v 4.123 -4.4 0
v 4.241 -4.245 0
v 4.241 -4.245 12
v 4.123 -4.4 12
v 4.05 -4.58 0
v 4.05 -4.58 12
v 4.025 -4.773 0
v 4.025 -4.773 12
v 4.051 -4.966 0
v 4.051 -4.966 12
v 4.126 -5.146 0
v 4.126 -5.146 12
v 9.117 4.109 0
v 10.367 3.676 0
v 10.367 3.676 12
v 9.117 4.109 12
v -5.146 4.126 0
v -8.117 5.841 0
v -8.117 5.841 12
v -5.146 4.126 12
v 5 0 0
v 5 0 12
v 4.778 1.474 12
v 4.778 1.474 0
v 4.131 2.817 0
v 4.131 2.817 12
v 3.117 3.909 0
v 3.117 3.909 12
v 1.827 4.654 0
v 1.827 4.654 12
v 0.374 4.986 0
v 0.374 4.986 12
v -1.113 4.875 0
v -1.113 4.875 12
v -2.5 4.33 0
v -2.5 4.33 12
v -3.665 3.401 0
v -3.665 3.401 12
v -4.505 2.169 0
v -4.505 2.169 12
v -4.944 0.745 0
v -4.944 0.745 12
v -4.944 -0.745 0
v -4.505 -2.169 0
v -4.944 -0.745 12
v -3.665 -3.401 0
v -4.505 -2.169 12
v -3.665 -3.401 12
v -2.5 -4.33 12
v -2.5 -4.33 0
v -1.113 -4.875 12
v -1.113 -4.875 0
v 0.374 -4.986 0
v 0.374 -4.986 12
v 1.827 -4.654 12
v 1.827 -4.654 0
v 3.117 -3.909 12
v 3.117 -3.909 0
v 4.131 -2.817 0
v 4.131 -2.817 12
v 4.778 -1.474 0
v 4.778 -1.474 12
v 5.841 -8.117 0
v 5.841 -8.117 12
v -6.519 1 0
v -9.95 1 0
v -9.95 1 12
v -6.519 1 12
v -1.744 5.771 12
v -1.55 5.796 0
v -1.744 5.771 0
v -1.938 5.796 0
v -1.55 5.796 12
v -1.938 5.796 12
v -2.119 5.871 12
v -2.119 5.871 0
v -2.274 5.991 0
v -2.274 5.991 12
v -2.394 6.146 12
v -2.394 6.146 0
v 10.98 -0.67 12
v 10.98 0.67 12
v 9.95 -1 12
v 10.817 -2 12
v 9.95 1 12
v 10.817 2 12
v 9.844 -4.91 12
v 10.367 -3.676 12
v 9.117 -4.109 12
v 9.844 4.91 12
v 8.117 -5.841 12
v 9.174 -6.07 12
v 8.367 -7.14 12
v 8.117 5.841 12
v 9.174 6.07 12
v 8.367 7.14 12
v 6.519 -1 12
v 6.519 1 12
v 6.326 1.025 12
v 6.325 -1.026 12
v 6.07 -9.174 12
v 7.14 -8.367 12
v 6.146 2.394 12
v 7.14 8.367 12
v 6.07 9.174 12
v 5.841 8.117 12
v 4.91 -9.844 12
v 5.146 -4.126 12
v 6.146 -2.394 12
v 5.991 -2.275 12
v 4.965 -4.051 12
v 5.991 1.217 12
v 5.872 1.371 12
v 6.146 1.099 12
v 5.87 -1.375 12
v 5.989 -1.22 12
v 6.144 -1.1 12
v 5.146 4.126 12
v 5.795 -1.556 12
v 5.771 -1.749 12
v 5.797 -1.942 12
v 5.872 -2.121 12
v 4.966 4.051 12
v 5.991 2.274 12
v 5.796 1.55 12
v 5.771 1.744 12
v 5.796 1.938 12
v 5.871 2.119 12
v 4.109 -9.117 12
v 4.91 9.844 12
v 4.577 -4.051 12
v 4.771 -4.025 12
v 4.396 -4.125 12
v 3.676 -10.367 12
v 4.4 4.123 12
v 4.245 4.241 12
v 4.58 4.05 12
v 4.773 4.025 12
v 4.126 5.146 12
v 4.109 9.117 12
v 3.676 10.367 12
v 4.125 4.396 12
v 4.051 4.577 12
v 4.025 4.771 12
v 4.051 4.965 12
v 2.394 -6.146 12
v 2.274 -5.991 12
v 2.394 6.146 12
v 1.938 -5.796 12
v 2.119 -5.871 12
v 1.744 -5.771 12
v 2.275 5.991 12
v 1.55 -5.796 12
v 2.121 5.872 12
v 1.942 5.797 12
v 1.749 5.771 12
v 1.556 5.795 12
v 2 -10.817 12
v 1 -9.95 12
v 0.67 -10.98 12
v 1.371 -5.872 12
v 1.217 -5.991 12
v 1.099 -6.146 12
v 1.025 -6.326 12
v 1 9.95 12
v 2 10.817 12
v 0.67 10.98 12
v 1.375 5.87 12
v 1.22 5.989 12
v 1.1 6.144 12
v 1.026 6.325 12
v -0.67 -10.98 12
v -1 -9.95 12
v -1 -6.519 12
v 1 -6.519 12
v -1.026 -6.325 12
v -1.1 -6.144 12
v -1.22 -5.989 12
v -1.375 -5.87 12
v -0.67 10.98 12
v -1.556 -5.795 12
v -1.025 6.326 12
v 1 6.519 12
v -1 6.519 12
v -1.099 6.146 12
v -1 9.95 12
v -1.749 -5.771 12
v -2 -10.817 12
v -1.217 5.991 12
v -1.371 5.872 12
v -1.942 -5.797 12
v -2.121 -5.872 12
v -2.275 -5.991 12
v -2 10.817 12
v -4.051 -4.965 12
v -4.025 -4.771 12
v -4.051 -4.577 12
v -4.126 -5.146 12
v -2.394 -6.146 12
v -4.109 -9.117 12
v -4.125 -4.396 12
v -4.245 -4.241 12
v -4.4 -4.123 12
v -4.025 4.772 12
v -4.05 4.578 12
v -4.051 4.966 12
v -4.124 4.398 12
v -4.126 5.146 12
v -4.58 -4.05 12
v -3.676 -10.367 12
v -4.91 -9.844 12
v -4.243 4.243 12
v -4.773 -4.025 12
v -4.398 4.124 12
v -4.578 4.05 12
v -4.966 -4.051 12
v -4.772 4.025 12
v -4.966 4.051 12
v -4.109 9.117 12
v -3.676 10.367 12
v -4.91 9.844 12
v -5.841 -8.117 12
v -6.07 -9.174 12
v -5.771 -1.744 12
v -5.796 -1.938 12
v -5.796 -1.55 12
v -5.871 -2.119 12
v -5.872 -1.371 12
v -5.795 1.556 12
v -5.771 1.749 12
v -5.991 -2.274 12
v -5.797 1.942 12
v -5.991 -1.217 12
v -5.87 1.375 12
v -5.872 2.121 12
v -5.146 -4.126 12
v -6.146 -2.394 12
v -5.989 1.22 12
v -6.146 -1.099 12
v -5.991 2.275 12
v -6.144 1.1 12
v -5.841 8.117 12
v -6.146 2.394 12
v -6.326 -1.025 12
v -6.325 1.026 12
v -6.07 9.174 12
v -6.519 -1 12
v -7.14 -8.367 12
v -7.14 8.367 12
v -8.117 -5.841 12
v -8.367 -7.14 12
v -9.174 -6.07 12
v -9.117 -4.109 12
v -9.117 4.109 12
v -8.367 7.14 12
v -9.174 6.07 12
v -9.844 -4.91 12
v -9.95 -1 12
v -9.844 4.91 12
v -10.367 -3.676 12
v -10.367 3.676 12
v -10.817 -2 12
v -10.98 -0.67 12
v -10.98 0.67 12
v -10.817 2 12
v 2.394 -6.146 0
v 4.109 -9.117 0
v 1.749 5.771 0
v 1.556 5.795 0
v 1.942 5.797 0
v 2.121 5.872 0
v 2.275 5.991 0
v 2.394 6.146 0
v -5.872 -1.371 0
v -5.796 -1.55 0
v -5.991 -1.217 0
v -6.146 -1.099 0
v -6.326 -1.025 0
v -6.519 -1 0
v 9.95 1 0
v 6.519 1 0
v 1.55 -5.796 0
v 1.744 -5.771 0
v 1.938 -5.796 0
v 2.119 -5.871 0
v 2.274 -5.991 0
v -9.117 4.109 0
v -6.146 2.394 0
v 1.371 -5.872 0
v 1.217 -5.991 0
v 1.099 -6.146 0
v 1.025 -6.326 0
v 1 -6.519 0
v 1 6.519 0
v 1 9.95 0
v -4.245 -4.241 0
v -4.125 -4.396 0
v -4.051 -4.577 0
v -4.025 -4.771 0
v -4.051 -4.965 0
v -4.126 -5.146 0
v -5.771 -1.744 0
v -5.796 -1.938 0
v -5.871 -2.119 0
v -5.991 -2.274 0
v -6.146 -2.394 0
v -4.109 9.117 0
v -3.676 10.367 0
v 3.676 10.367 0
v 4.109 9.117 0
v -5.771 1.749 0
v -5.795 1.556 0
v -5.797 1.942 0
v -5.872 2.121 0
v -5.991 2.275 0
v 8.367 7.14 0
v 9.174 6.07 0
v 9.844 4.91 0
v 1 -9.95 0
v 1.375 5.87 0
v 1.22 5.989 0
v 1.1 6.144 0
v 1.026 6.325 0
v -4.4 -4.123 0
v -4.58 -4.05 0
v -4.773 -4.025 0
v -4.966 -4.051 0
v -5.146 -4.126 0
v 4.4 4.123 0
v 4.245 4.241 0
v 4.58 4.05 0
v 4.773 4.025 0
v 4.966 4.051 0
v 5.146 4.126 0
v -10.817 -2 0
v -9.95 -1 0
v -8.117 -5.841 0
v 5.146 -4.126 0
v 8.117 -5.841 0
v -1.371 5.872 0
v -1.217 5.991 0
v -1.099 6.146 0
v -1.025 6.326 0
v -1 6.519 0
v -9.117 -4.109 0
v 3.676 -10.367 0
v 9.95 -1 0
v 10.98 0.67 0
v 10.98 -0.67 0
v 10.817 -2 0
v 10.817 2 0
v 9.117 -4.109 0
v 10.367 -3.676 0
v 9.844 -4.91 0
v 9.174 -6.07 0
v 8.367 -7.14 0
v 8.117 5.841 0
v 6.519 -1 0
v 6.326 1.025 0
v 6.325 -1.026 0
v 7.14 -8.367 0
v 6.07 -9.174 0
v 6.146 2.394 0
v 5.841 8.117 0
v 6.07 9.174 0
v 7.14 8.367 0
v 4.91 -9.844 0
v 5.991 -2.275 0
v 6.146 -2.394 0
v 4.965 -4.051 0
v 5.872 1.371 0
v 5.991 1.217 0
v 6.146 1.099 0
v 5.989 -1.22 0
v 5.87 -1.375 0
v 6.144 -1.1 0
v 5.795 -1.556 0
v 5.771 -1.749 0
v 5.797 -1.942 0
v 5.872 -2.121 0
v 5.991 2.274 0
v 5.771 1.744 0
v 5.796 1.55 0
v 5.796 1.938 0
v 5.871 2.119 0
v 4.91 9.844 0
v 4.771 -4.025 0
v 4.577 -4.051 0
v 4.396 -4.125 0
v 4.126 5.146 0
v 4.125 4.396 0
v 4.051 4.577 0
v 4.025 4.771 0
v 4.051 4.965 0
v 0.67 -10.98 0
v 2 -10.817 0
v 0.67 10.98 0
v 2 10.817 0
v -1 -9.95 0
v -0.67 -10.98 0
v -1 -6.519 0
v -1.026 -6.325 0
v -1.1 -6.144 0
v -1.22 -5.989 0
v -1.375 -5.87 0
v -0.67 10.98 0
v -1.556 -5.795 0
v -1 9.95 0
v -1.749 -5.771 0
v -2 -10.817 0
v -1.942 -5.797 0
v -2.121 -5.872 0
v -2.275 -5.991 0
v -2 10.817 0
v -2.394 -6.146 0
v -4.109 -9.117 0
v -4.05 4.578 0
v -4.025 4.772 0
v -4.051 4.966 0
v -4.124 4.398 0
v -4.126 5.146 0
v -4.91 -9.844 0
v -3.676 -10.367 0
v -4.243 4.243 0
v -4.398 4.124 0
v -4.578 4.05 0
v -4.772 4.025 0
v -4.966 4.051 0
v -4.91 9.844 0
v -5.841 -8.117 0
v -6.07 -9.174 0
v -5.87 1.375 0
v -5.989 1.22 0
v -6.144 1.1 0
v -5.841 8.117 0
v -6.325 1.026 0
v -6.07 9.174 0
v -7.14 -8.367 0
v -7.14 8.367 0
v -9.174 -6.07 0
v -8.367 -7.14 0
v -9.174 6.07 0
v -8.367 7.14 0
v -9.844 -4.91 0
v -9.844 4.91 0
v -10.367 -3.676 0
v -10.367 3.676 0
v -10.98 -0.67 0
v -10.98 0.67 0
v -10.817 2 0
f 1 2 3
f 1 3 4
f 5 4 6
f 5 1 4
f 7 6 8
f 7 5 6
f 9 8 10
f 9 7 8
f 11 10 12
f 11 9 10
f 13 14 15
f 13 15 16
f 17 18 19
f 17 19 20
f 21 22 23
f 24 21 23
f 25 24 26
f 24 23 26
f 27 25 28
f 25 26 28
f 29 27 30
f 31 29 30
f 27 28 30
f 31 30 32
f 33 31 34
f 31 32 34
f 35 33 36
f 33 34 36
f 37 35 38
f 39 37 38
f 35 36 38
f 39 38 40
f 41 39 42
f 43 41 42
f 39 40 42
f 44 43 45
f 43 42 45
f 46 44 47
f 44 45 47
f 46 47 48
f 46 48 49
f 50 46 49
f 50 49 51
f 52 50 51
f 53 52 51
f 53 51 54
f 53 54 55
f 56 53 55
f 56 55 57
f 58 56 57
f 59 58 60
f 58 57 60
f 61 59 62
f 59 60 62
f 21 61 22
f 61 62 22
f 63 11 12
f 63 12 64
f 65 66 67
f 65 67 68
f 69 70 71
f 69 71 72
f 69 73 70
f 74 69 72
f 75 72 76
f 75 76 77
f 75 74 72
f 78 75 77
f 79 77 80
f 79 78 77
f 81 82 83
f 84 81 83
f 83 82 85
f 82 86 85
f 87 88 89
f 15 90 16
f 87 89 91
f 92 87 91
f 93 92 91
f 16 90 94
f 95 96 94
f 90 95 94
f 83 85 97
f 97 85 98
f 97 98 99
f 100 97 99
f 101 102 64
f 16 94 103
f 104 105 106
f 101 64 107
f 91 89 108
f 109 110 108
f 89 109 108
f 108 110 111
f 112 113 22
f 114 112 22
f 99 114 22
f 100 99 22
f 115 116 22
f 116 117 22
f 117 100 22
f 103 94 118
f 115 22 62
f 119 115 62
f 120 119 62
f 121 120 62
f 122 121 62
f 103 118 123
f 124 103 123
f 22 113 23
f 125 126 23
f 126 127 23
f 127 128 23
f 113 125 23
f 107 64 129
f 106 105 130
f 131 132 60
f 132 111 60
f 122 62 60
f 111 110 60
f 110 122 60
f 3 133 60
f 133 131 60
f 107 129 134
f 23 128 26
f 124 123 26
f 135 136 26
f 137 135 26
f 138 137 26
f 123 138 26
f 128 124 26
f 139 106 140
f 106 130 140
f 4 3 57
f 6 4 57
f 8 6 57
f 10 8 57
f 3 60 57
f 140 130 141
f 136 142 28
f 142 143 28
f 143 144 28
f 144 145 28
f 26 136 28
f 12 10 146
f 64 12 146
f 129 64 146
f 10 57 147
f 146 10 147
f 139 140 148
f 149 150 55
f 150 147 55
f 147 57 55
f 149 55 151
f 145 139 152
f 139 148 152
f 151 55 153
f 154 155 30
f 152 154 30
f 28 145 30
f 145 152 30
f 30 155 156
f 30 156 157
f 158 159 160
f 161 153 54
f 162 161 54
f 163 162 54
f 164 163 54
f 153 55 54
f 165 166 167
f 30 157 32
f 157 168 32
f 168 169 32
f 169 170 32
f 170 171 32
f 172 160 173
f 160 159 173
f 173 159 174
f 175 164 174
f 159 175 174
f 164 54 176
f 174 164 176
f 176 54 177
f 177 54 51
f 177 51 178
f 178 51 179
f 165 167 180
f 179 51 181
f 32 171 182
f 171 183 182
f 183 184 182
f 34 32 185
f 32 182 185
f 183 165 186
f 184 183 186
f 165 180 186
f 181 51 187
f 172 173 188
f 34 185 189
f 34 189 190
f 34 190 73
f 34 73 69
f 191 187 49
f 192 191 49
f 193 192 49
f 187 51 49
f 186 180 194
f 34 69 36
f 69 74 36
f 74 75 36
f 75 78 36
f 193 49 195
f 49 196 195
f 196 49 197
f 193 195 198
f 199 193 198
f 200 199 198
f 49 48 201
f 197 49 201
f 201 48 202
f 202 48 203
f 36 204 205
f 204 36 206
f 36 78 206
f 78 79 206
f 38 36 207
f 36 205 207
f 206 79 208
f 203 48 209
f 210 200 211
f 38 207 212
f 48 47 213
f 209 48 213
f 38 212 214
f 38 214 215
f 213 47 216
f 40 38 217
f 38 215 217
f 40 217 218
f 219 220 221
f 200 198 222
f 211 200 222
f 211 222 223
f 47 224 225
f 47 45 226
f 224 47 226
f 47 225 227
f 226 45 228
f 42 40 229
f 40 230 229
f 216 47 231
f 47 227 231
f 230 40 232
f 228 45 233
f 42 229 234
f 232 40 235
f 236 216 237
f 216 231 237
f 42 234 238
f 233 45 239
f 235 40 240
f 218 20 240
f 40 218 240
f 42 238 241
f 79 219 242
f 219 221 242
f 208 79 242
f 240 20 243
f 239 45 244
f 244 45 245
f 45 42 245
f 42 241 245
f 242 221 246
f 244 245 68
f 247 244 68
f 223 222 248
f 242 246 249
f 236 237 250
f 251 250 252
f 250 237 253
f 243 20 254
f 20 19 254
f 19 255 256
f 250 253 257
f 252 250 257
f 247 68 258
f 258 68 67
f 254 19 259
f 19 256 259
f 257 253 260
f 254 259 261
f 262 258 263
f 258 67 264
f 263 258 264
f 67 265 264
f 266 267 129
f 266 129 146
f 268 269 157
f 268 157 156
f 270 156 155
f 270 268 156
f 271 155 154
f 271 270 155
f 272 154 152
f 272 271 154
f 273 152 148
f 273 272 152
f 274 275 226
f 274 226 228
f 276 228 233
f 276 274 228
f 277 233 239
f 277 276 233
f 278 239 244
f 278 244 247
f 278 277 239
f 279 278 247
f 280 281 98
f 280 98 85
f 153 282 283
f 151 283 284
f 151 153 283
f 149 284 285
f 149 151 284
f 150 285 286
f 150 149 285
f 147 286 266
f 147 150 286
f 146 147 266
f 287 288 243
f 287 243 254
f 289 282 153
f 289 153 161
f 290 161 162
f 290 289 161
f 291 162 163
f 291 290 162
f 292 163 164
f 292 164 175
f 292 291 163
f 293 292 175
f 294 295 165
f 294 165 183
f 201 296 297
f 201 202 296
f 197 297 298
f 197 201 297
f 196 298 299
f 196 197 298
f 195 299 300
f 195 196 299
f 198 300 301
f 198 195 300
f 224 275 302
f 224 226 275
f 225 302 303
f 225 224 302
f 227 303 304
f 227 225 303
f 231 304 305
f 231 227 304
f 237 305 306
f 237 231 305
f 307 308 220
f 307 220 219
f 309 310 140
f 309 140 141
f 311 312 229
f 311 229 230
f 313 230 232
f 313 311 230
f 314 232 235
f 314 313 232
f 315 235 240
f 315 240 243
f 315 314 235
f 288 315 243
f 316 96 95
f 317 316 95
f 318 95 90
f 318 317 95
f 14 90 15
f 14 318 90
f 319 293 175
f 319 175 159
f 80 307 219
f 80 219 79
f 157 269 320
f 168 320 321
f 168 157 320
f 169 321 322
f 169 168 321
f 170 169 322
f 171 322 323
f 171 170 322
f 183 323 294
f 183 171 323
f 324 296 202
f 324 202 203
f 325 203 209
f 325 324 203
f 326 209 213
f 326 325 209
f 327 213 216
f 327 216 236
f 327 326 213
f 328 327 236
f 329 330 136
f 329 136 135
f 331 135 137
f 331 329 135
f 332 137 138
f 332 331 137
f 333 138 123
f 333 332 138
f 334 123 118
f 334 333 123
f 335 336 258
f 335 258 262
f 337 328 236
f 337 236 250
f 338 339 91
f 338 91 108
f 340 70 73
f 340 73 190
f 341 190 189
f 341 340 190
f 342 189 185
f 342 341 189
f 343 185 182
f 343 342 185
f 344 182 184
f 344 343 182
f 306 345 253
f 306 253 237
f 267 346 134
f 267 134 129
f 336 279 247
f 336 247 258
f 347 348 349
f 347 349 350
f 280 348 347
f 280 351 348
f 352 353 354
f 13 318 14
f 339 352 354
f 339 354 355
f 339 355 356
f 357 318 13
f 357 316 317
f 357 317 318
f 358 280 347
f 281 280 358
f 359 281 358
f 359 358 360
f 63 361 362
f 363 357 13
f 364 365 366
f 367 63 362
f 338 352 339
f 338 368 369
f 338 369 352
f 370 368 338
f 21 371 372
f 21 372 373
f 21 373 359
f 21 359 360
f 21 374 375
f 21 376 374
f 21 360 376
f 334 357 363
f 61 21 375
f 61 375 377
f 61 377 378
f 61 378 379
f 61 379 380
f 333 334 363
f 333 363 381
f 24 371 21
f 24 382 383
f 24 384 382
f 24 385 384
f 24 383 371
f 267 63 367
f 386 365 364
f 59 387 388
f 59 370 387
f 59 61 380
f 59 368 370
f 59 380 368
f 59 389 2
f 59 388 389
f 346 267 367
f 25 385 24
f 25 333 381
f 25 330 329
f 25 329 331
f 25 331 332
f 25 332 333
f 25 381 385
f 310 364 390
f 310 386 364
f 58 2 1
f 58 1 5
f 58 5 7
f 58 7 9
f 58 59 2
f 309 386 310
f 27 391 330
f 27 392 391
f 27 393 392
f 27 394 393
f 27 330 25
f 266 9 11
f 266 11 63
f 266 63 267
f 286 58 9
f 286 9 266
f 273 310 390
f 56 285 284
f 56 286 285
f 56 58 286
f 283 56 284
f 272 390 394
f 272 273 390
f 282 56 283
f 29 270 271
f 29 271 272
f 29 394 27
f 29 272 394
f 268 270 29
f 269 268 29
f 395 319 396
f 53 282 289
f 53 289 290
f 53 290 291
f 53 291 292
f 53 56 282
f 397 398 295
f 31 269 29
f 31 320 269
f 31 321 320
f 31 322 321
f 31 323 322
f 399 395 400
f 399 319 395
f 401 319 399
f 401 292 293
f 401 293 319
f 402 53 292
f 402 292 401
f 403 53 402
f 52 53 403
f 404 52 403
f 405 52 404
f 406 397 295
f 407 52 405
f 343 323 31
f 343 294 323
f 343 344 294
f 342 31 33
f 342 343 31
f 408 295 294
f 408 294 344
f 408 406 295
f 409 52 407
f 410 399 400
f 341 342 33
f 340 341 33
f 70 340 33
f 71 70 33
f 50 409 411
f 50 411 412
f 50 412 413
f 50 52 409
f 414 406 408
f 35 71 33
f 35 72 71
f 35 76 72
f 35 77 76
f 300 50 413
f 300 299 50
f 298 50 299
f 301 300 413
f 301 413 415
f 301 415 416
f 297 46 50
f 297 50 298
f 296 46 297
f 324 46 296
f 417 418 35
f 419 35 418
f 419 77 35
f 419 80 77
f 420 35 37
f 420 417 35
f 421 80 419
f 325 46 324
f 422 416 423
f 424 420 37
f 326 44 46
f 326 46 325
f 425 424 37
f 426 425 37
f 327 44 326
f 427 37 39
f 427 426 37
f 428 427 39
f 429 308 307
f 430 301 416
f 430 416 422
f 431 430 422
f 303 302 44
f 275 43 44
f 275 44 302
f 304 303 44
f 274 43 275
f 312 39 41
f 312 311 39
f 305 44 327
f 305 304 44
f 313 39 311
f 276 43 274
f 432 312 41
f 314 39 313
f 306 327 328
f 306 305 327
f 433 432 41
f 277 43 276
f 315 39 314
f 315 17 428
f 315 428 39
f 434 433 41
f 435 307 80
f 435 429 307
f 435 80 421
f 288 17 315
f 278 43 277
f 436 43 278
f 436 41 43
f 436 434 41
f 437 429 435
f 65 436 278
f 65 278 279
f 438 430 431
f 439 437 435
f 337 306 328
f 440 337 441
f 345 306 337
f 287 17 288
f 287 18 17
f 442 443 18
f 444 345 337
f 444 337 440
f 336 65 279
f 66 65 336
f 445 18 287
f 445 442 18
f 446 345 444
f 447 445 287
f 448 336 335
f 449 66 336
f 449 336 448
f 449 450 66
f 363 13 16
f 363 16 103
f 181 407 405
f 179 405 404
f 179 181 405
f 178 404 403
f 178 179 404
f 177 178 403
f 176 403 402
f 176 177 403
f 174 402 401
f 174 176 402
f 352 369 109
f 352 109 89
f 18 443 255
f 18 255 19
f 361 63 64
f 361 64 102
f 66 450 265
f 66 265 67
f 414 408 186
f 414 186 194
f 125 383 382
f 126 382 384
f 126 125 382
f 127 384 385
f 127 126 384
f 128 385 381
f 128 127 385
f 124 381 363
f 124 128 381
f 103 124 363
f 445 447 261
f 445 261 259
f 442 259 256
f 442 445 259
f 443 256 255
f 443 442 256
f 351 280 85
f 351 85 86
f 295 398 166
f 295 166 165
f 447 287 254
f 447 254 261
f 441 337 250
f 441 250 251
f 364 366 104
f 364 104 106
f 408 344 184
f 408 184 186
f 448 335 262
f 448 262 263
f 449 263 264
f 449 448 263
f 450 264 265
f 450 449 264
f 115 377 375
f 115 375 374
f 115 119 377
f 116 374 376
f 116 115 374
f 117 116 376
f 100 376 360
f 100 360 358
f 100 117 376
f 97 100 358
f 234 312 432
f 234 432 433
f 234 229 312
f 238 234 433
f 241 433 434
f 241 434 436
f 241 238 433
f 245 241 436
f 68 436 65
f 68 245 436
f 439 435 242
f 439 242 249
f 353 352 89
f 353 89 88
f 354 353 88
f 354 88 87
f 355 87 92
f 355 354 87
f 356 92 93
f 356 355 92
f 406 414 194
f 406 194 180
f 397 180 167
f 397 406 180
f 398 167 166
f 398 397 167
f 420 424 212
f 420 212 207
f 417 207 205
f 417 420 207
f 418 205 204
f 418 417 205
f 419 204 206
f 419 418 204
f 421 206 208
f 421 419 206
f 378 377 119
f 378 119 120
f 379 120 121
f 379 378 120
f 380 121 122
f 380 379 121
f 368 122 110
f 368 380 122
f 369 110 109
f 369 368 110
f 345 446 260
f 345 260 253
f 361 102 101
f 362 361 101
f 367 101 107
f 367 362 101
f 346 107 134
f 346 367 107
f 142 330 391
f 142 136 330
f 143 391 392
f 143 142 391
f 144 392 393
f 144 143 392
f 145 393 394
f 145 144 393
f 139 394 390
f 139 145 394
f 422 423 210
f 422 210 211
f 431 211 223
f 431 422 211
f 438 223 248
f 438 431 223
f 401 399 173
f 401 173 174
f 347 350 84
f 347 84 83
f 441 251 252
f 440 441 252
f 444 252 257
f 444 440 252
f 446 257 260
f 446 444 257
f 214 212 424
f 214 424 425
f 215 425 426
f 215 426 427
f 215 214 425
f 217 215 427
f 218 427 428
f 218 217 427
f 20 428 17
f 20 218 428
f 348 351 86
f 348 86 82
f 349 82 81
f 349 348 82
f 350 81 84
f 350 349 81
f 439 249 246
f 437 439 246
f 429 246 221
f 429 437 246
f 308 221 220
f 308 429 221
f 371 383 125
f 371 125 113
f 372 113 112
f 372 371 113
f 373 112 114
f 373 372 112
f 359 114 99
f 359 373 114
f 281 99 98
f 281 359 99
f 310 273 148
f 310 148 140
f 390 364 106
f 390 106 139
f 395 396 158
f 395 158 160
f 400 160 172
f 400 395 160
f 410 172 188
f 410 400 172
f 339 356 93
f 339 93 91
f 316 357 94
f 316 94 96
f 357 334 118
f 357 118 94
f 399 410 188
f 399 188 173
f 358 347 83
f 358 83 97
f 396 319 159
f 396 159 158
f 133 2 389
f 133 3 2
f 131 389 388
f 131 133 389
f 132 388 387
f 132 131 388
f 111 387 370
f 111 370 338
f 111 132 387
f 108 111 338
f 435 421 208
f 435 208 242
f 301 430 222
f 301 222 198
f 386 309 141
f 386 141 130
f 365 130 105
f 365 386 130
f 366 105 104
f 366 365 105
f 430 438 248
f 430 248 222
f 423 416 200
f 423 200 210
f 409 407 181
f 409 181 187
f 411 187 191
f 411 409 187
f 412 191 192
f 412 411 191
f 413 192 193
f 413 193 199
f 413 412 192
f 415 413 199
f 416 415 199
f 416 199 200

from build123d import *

# Parameters (mm, degrees)
BOSS_EXTRUDE1_DEPTH = 12
SKETCH2_R           = 6
BOSS_EXTRUDE2_DEPTH = 12
SKETCH3_R           = 5
CUT_EXTRUDE1_DEPTH  = 12
FILLET1_R           = 0.75
FILLET2_R           = 0.75
FILLET3_R           = 0.75
FILLET4_R           = 0.75


with BuildPart() as part:
    # Sketch1 → Boss-Extrude1 (new body)
    with BuildSketch(Plane.XY):
        with BuildLine():
            Line((-1, 9.949874371), (-2, 10.816653826))
            ThreePointArc((-2, 10.816653826), (0, 11), (2, 10.816653826))
            Line((2, 10.816653826), (1, 9.949874371))
            Line((1, 9.949874371), (1, 4.898979486))
            ThreePointArc((1, 4.898979486), (1.294095226, 4.829629131), (1.583464339, 4.742640687))
            Line((1.583464339, 4.742640687), (4.108911782, 9.11684397))
            Line((4.108911782, 9.11684397), (3.676276106, 10.367496998))
            ThreePointArc((3.676276106, 10.367496998), (5.5, 9.526279442), (7.140377721, 8.367496998))
            Line((7.140377721, 8.367496998), (5.840962589, 8.11684397))
            Line((5.840962589, 8.11684397), (3.315515147, 3.742640687))
            ThreePointArc((3.315515147, 3.742640687), (3.535533906, 3.535533906), (3.742640687, 3.315515147))
            Line((3.742640687, 3.315515147), (8.11684397, 5.840962589))
            Line((8.11684397, 5.840962589), (8.367496998, 7.140377721))
            ThreePointArc((8.367496998, 7.140377721), (9.526279442, 5.5), (10.367496998, 3.676276106))
            Line((10.367496998, 3.676276106), (9.11684397, 4.108911782))
            Line((9.11684397, 4.108911782), (4.742640687, 1.583464339))
            ThreePointArc((4.742640687, 1.583464339), (4.829629131, 1.294095226), (4.898979486, 1))
            Line((4.898979486, 1), (9.949874371, 1))
            Line((9.949874371, 1), (10.816653826, 2))
            ThreePointArc((10.816653826, 2), (11, 0), (10.816653826, -2))
            Line((10.816653826, -2), (9.949874371, -1))
            Line((9.949874371, -1), (4.898979486, -1))
            ThreePointArc((4.898979486, -1), (4.829629131, -1.294095226), (4.742640687, -1.583464339))
            Line((4.742640687, -1.583464339), (9.11684397, -4.108911782))
            Line((9.11684397, -4.108911782), (10.367496998, -3.676276106))
            ThreePointArc((10.367496998, -3.676276106), (9.526279442, -5.5), (8.367496998, -7.140377721))
            Line((8.367496998, -7.140377721), (8.11684397, -5.840962589))
            Line((8.11684397, -5.840962589), (3.742640687, -3.315515147))
            ThreePointArc((3.742640687, -3.315515147), (3.535533906, -3.535533906), (3.315515147, -3.742640687))
            Line((3.315515147, -3.742640687), (5.840962589, -8.11684397))
            Line((5.840962589, -8.11684397), (7.140377721, -8.367496998))
            ThreePointArc((7.140377721, -8.367496998), (5.5, -9.526279442), (3.676276106, -10.367496998))
            Line((3.676276106, -10.367496998), (4.108911782, -9.11684397))
            Line((4.108911782, -9.11684397), (1.583464339, -4.742640687))
            ThreePointArc((1.583464339, -4.742640687), (1.294095226, -4.829629131), (1, -4.898979486))
            Line((1, -4.898979486), (1, -9.949874371))
            Line((1, -9.949874371), (2, -10.816653826))
            ThreePointArc((2, -10.816653826), (0, -11), (-2, -10.816653826))
            Line((-2, -10.816653826), (-1, -9.949874371))
            Line((-1, -9.949874371), (-1, -4.898979486))
            ThreePointArc((-1, -4.898979486), (-1.294095226, -4.829629131), (-1.583464339, -4.742640687))
            Line((-1.583464339, -4.742640687), (-4.108911782, -9.11684397))
            Line((-4.108911782, -9.11684397), (-3.676276106, -10.367496998))
            ThreePointArc((-3.676276106, -10.367496998), (-5.5, -9.526279442), (-7.140377721, -8.367496998))
            Line((-7.140377721, -8.367496998), (-5.840962589, -8.11684397))
            Line((-5.840962589, -8.11684397), (-3.315515147, -3.742640687))
            ThreePointArc((-3.315515147, -3.742640687), (-3.535533906, -3.535533906), (-3.742640687, -3.315515147))
            Line((-3.742640687, -3.315515147), (-8.11684397, -5.840962589))
            Line((-8.11684397, -5.840962589), (-8.367496998, -7.140377721))
            ThreePointArc((-8.367496998, -7.140377721), (-9.526279442, -5.5), (-10.367496998, -3.676276106))
            Line((-10.367496998, -3.676276106), (-9.11684397, -4.108911782))
            Line((-9.11684397, -4.108911782), (-4.742640687, -1.583464339))
            ThreePointArc((-4.742640687, -1.583464339), (-4.829629131, -1.294095226), (-4.898979486, -1))
            Line((-4.898979486, -1), (-9.949874371, -1))
            Line((-9.949874371, -1), (-10.816653826, -2))
            ThreePointArc((-10.816653826, -2), (-11, 0), (-10.816653826, 2))
            Line((-10.816653826, 2), (-9.949874371, 1))
            Line((-9.949874371, 1), (-4.898979486, 1))
            ThreePointArc((-4.898979486, 1), (-4.829629131, 1.294095226), (-4.742640687, 1.583464339))
            Line((-4.742640687, 1.583464339), (-9.11684397, 4.108911782))
            Line((-9.11684397, 4.108911782), (-10.367496998, 3.676276106))
            ThreePointArc((-10.367496998, 3.676276106), (-9.526279442, 5.5), (-8.367496998, 7.140377721))
            Line((-8.367496998, 7.140377721), (-8.11684397, 5.840962589))
            Line((-8.11684397, 5.840962589), (-3.742640687, 3.315515147))
            ThreePointArc((-3.742640687, 3.315515147), (-3.535533906, 3.535533906), (-3.315515147, 3.742640687))
            Line((-3.315515147, 3.742640687), (-5.840962589, 8.11684397))
            Line((-5.840962589, 8.11684397), (-7.140377721, 8.367496998))
            ThreePointArc((-7.140377721, 8.367496998), (-5.5, 9.526279442), (-3.676276106, 10.367496998))
            Line((-3.676276106, 10.367496998), (-4.108911782, 9.11684397))
            Line((-4.108911782, 9.11684397), (-1.583464339, 4.742640687))
            ThreePointArc((-1.583464339, 4.742640687), (-1.294095226, 4.829629131), (-1, 4.898979486))
            Line((-1, 4.898979486), (-1, 9.949874371))
        make_face()
    extrude(amount=BOSS_EXTRUDE1_DEPTH)

    # Sketch2 → Boss-Extrude2 (add)
    with BuildSketch(Plane.XY.offset(12)):
        Circle(SKETCH2_R)
    extrude(amount=-BOSS_EXTRUDE2_DEPTH)

    # Sketch3 → Cut-Extrude1 (cut)
    with BuildSketch(Plane.XY.offset(12)):
        Circle(SKETCH3_R)
    extrude(amount=-CUT_EXTRUDE1_DEPTH, mode=Mode.SUBTRACT)

    # Fillet1
    fillet1_edges = [part.edges().sort_by_distance(p)[0] for p in [
        (-4.623475383, 3.824065295, 6),
    ]]
    fillet(fillet1_edges, radius=FILLET1_R)

    # Fillet2
    # the kernel refuses this fillet: 0.75 mm, written as the material it adds along each edge
    with BuildSketch(Plane(origin=(-3.824065295, 4.623475383, 0), x_dir=(-0.7395125518358552, -0.6731427676780178, 0), z_dir=(0, 0, 1))) as fillet2_piece_1:
        with BuildLine():
            CenterArc((0.604168803, -0.749157497), FILLET2_R, 92.716022766, 74.973886241)
            Line((-0.128587227, -0.589255651), (0, 0))
            ThreePointArc((0, 0), (0.284314731, -0.006740024), (0.568629461, 0))
        make_face()
    extrude(amount=12)

    # Fillet3
    fillet3_edges = [part.edges().sort_by_distance(p)[0] for p in [
        (3.824065295, 4.623475383, 6),
        (1, 5.916079783, 6),
        (-2.092014488, 5.623475383, 6),
        (-5.916079783, 1, 6),
        (-5.623475383, -2.092014488, 6),
        (-3.824065295, -4.623475383, 6),
        (-1, -5.916079783, 6),
        (2.092014488, -5.623475383, 6),
        (4.623475383, -3.824065295, 6),
        (5.916079783, -1, 6),
        (5.623475383, 2.092014488, 6),
    ]]
    fillet(fillet3_edges, radius=FILLET3_R)

    # Fillet4
    # the kernel refuses this fillet: 0.75 mm, written as the material it adds along each edge
    with BuildSketch(Plane(origin=(-5.916079783, -1, 0), x_dir=(-1, 0, 0), z_dir=(0, 0, 1)), Plane(origin=(-4.623475383, -3.824065295, 0), x_dir=(-0.8660254037844433, -0.4999999999999918, 0), z_dir=(0, 0, 1)), Plane(origin=(-2.092014488, -5.623475383, 0), x_dir=(-0.5000000000000068, -0.8660254037844348, 0), z_dir=(0, 0, 1)), Plane(origin=(1, -5.916079783, 0), x_dir=(0, -1, 0), z_dir=(0, 0, 1)), Plane(origin=(-5.623475383, 2.092014488, 0), x_dir=(-0.8660254037844328, 0.5000000000000101, 0), z_dir=(0, 0, 1))) as fillet4_piece_1:
        with BuildLine():
            CenterArc((0.603099347, 0.75), FILLET4_R, 195.444398539, 74.555601461)
            Line((-0.119817654, 0.550272663), (-0.134275994, 0.546278116))
            ThreePointArc((-0.134275994, 0.546278116), (-0.068105699, 0.273351526), (-0.014790199, -0.0025))
            Line((-0.014790199, -0.0025), (0, -0.015))
            Line((0, -0.015), (0.603099347, -0.015))
            Line((0.603099347, -0.015), (0.603099347, 0))
        make_face()
    extrude(amount=12)
    with BuildSketch(Plane(origin=(3.824065295, -4.623475383, 0), x_dir=(0.7398192740207736, 0.6728056493426431, 0), z_dir=(0, 0, 1)), Plane(origin=(5.623475383, -2.092014488, 0), x_dir=(0.30429946084002696, 0.9525764211508013, 0), z_dir=(0, 0, 1)), Plane(origin=(5.916079783, 1, 0), x_dir=(-0.21275714713002825, 0.9771051101826719, 0), z_dir=(0, 0, 1)), Plane(origin=(4.623475383, 3.824065295, 0), x_dir=(-0.6728056493426434, 0.7398192740207732, 0), z_dir=(0, 0, 1)), Plane(origin=(2.092014488, 5.623475383, 0), x_dir=(-0.9525764211508011, 0.30429946084002774, 0), z_dir=(0, 0, 1)), Plane(origin=(-1, 5.916079783, 0), x_dir=(-0.9771051101826725, -0.21275714713002564, 0), z_dir=(0, 0, 1))) as fillet4_piece_2:
        with BuildLine():
            CenterArc((0.604515136, -0.748859315), FILLET4_R, 93.160421305, 74.555601461)
            Line((-0.128313697, -0.589291454), (-0.142970273, -0.586100097))
            Line((-0.142970273, -0.586100097), (-0.014656577, 0.003191357))
            Line((-0.014656577, 0.003191357), (0.000703958, 0.014983472))
            ThreePointArc((0.000703958, 0.014983472), (0.281583147, 0.008388935), (0.562339316, 0.014977186))
            Line((0.562339316, 0.014977186), (0.563166293, 0))
        make_face()
    extrude(amount=12)


solid = part.part
